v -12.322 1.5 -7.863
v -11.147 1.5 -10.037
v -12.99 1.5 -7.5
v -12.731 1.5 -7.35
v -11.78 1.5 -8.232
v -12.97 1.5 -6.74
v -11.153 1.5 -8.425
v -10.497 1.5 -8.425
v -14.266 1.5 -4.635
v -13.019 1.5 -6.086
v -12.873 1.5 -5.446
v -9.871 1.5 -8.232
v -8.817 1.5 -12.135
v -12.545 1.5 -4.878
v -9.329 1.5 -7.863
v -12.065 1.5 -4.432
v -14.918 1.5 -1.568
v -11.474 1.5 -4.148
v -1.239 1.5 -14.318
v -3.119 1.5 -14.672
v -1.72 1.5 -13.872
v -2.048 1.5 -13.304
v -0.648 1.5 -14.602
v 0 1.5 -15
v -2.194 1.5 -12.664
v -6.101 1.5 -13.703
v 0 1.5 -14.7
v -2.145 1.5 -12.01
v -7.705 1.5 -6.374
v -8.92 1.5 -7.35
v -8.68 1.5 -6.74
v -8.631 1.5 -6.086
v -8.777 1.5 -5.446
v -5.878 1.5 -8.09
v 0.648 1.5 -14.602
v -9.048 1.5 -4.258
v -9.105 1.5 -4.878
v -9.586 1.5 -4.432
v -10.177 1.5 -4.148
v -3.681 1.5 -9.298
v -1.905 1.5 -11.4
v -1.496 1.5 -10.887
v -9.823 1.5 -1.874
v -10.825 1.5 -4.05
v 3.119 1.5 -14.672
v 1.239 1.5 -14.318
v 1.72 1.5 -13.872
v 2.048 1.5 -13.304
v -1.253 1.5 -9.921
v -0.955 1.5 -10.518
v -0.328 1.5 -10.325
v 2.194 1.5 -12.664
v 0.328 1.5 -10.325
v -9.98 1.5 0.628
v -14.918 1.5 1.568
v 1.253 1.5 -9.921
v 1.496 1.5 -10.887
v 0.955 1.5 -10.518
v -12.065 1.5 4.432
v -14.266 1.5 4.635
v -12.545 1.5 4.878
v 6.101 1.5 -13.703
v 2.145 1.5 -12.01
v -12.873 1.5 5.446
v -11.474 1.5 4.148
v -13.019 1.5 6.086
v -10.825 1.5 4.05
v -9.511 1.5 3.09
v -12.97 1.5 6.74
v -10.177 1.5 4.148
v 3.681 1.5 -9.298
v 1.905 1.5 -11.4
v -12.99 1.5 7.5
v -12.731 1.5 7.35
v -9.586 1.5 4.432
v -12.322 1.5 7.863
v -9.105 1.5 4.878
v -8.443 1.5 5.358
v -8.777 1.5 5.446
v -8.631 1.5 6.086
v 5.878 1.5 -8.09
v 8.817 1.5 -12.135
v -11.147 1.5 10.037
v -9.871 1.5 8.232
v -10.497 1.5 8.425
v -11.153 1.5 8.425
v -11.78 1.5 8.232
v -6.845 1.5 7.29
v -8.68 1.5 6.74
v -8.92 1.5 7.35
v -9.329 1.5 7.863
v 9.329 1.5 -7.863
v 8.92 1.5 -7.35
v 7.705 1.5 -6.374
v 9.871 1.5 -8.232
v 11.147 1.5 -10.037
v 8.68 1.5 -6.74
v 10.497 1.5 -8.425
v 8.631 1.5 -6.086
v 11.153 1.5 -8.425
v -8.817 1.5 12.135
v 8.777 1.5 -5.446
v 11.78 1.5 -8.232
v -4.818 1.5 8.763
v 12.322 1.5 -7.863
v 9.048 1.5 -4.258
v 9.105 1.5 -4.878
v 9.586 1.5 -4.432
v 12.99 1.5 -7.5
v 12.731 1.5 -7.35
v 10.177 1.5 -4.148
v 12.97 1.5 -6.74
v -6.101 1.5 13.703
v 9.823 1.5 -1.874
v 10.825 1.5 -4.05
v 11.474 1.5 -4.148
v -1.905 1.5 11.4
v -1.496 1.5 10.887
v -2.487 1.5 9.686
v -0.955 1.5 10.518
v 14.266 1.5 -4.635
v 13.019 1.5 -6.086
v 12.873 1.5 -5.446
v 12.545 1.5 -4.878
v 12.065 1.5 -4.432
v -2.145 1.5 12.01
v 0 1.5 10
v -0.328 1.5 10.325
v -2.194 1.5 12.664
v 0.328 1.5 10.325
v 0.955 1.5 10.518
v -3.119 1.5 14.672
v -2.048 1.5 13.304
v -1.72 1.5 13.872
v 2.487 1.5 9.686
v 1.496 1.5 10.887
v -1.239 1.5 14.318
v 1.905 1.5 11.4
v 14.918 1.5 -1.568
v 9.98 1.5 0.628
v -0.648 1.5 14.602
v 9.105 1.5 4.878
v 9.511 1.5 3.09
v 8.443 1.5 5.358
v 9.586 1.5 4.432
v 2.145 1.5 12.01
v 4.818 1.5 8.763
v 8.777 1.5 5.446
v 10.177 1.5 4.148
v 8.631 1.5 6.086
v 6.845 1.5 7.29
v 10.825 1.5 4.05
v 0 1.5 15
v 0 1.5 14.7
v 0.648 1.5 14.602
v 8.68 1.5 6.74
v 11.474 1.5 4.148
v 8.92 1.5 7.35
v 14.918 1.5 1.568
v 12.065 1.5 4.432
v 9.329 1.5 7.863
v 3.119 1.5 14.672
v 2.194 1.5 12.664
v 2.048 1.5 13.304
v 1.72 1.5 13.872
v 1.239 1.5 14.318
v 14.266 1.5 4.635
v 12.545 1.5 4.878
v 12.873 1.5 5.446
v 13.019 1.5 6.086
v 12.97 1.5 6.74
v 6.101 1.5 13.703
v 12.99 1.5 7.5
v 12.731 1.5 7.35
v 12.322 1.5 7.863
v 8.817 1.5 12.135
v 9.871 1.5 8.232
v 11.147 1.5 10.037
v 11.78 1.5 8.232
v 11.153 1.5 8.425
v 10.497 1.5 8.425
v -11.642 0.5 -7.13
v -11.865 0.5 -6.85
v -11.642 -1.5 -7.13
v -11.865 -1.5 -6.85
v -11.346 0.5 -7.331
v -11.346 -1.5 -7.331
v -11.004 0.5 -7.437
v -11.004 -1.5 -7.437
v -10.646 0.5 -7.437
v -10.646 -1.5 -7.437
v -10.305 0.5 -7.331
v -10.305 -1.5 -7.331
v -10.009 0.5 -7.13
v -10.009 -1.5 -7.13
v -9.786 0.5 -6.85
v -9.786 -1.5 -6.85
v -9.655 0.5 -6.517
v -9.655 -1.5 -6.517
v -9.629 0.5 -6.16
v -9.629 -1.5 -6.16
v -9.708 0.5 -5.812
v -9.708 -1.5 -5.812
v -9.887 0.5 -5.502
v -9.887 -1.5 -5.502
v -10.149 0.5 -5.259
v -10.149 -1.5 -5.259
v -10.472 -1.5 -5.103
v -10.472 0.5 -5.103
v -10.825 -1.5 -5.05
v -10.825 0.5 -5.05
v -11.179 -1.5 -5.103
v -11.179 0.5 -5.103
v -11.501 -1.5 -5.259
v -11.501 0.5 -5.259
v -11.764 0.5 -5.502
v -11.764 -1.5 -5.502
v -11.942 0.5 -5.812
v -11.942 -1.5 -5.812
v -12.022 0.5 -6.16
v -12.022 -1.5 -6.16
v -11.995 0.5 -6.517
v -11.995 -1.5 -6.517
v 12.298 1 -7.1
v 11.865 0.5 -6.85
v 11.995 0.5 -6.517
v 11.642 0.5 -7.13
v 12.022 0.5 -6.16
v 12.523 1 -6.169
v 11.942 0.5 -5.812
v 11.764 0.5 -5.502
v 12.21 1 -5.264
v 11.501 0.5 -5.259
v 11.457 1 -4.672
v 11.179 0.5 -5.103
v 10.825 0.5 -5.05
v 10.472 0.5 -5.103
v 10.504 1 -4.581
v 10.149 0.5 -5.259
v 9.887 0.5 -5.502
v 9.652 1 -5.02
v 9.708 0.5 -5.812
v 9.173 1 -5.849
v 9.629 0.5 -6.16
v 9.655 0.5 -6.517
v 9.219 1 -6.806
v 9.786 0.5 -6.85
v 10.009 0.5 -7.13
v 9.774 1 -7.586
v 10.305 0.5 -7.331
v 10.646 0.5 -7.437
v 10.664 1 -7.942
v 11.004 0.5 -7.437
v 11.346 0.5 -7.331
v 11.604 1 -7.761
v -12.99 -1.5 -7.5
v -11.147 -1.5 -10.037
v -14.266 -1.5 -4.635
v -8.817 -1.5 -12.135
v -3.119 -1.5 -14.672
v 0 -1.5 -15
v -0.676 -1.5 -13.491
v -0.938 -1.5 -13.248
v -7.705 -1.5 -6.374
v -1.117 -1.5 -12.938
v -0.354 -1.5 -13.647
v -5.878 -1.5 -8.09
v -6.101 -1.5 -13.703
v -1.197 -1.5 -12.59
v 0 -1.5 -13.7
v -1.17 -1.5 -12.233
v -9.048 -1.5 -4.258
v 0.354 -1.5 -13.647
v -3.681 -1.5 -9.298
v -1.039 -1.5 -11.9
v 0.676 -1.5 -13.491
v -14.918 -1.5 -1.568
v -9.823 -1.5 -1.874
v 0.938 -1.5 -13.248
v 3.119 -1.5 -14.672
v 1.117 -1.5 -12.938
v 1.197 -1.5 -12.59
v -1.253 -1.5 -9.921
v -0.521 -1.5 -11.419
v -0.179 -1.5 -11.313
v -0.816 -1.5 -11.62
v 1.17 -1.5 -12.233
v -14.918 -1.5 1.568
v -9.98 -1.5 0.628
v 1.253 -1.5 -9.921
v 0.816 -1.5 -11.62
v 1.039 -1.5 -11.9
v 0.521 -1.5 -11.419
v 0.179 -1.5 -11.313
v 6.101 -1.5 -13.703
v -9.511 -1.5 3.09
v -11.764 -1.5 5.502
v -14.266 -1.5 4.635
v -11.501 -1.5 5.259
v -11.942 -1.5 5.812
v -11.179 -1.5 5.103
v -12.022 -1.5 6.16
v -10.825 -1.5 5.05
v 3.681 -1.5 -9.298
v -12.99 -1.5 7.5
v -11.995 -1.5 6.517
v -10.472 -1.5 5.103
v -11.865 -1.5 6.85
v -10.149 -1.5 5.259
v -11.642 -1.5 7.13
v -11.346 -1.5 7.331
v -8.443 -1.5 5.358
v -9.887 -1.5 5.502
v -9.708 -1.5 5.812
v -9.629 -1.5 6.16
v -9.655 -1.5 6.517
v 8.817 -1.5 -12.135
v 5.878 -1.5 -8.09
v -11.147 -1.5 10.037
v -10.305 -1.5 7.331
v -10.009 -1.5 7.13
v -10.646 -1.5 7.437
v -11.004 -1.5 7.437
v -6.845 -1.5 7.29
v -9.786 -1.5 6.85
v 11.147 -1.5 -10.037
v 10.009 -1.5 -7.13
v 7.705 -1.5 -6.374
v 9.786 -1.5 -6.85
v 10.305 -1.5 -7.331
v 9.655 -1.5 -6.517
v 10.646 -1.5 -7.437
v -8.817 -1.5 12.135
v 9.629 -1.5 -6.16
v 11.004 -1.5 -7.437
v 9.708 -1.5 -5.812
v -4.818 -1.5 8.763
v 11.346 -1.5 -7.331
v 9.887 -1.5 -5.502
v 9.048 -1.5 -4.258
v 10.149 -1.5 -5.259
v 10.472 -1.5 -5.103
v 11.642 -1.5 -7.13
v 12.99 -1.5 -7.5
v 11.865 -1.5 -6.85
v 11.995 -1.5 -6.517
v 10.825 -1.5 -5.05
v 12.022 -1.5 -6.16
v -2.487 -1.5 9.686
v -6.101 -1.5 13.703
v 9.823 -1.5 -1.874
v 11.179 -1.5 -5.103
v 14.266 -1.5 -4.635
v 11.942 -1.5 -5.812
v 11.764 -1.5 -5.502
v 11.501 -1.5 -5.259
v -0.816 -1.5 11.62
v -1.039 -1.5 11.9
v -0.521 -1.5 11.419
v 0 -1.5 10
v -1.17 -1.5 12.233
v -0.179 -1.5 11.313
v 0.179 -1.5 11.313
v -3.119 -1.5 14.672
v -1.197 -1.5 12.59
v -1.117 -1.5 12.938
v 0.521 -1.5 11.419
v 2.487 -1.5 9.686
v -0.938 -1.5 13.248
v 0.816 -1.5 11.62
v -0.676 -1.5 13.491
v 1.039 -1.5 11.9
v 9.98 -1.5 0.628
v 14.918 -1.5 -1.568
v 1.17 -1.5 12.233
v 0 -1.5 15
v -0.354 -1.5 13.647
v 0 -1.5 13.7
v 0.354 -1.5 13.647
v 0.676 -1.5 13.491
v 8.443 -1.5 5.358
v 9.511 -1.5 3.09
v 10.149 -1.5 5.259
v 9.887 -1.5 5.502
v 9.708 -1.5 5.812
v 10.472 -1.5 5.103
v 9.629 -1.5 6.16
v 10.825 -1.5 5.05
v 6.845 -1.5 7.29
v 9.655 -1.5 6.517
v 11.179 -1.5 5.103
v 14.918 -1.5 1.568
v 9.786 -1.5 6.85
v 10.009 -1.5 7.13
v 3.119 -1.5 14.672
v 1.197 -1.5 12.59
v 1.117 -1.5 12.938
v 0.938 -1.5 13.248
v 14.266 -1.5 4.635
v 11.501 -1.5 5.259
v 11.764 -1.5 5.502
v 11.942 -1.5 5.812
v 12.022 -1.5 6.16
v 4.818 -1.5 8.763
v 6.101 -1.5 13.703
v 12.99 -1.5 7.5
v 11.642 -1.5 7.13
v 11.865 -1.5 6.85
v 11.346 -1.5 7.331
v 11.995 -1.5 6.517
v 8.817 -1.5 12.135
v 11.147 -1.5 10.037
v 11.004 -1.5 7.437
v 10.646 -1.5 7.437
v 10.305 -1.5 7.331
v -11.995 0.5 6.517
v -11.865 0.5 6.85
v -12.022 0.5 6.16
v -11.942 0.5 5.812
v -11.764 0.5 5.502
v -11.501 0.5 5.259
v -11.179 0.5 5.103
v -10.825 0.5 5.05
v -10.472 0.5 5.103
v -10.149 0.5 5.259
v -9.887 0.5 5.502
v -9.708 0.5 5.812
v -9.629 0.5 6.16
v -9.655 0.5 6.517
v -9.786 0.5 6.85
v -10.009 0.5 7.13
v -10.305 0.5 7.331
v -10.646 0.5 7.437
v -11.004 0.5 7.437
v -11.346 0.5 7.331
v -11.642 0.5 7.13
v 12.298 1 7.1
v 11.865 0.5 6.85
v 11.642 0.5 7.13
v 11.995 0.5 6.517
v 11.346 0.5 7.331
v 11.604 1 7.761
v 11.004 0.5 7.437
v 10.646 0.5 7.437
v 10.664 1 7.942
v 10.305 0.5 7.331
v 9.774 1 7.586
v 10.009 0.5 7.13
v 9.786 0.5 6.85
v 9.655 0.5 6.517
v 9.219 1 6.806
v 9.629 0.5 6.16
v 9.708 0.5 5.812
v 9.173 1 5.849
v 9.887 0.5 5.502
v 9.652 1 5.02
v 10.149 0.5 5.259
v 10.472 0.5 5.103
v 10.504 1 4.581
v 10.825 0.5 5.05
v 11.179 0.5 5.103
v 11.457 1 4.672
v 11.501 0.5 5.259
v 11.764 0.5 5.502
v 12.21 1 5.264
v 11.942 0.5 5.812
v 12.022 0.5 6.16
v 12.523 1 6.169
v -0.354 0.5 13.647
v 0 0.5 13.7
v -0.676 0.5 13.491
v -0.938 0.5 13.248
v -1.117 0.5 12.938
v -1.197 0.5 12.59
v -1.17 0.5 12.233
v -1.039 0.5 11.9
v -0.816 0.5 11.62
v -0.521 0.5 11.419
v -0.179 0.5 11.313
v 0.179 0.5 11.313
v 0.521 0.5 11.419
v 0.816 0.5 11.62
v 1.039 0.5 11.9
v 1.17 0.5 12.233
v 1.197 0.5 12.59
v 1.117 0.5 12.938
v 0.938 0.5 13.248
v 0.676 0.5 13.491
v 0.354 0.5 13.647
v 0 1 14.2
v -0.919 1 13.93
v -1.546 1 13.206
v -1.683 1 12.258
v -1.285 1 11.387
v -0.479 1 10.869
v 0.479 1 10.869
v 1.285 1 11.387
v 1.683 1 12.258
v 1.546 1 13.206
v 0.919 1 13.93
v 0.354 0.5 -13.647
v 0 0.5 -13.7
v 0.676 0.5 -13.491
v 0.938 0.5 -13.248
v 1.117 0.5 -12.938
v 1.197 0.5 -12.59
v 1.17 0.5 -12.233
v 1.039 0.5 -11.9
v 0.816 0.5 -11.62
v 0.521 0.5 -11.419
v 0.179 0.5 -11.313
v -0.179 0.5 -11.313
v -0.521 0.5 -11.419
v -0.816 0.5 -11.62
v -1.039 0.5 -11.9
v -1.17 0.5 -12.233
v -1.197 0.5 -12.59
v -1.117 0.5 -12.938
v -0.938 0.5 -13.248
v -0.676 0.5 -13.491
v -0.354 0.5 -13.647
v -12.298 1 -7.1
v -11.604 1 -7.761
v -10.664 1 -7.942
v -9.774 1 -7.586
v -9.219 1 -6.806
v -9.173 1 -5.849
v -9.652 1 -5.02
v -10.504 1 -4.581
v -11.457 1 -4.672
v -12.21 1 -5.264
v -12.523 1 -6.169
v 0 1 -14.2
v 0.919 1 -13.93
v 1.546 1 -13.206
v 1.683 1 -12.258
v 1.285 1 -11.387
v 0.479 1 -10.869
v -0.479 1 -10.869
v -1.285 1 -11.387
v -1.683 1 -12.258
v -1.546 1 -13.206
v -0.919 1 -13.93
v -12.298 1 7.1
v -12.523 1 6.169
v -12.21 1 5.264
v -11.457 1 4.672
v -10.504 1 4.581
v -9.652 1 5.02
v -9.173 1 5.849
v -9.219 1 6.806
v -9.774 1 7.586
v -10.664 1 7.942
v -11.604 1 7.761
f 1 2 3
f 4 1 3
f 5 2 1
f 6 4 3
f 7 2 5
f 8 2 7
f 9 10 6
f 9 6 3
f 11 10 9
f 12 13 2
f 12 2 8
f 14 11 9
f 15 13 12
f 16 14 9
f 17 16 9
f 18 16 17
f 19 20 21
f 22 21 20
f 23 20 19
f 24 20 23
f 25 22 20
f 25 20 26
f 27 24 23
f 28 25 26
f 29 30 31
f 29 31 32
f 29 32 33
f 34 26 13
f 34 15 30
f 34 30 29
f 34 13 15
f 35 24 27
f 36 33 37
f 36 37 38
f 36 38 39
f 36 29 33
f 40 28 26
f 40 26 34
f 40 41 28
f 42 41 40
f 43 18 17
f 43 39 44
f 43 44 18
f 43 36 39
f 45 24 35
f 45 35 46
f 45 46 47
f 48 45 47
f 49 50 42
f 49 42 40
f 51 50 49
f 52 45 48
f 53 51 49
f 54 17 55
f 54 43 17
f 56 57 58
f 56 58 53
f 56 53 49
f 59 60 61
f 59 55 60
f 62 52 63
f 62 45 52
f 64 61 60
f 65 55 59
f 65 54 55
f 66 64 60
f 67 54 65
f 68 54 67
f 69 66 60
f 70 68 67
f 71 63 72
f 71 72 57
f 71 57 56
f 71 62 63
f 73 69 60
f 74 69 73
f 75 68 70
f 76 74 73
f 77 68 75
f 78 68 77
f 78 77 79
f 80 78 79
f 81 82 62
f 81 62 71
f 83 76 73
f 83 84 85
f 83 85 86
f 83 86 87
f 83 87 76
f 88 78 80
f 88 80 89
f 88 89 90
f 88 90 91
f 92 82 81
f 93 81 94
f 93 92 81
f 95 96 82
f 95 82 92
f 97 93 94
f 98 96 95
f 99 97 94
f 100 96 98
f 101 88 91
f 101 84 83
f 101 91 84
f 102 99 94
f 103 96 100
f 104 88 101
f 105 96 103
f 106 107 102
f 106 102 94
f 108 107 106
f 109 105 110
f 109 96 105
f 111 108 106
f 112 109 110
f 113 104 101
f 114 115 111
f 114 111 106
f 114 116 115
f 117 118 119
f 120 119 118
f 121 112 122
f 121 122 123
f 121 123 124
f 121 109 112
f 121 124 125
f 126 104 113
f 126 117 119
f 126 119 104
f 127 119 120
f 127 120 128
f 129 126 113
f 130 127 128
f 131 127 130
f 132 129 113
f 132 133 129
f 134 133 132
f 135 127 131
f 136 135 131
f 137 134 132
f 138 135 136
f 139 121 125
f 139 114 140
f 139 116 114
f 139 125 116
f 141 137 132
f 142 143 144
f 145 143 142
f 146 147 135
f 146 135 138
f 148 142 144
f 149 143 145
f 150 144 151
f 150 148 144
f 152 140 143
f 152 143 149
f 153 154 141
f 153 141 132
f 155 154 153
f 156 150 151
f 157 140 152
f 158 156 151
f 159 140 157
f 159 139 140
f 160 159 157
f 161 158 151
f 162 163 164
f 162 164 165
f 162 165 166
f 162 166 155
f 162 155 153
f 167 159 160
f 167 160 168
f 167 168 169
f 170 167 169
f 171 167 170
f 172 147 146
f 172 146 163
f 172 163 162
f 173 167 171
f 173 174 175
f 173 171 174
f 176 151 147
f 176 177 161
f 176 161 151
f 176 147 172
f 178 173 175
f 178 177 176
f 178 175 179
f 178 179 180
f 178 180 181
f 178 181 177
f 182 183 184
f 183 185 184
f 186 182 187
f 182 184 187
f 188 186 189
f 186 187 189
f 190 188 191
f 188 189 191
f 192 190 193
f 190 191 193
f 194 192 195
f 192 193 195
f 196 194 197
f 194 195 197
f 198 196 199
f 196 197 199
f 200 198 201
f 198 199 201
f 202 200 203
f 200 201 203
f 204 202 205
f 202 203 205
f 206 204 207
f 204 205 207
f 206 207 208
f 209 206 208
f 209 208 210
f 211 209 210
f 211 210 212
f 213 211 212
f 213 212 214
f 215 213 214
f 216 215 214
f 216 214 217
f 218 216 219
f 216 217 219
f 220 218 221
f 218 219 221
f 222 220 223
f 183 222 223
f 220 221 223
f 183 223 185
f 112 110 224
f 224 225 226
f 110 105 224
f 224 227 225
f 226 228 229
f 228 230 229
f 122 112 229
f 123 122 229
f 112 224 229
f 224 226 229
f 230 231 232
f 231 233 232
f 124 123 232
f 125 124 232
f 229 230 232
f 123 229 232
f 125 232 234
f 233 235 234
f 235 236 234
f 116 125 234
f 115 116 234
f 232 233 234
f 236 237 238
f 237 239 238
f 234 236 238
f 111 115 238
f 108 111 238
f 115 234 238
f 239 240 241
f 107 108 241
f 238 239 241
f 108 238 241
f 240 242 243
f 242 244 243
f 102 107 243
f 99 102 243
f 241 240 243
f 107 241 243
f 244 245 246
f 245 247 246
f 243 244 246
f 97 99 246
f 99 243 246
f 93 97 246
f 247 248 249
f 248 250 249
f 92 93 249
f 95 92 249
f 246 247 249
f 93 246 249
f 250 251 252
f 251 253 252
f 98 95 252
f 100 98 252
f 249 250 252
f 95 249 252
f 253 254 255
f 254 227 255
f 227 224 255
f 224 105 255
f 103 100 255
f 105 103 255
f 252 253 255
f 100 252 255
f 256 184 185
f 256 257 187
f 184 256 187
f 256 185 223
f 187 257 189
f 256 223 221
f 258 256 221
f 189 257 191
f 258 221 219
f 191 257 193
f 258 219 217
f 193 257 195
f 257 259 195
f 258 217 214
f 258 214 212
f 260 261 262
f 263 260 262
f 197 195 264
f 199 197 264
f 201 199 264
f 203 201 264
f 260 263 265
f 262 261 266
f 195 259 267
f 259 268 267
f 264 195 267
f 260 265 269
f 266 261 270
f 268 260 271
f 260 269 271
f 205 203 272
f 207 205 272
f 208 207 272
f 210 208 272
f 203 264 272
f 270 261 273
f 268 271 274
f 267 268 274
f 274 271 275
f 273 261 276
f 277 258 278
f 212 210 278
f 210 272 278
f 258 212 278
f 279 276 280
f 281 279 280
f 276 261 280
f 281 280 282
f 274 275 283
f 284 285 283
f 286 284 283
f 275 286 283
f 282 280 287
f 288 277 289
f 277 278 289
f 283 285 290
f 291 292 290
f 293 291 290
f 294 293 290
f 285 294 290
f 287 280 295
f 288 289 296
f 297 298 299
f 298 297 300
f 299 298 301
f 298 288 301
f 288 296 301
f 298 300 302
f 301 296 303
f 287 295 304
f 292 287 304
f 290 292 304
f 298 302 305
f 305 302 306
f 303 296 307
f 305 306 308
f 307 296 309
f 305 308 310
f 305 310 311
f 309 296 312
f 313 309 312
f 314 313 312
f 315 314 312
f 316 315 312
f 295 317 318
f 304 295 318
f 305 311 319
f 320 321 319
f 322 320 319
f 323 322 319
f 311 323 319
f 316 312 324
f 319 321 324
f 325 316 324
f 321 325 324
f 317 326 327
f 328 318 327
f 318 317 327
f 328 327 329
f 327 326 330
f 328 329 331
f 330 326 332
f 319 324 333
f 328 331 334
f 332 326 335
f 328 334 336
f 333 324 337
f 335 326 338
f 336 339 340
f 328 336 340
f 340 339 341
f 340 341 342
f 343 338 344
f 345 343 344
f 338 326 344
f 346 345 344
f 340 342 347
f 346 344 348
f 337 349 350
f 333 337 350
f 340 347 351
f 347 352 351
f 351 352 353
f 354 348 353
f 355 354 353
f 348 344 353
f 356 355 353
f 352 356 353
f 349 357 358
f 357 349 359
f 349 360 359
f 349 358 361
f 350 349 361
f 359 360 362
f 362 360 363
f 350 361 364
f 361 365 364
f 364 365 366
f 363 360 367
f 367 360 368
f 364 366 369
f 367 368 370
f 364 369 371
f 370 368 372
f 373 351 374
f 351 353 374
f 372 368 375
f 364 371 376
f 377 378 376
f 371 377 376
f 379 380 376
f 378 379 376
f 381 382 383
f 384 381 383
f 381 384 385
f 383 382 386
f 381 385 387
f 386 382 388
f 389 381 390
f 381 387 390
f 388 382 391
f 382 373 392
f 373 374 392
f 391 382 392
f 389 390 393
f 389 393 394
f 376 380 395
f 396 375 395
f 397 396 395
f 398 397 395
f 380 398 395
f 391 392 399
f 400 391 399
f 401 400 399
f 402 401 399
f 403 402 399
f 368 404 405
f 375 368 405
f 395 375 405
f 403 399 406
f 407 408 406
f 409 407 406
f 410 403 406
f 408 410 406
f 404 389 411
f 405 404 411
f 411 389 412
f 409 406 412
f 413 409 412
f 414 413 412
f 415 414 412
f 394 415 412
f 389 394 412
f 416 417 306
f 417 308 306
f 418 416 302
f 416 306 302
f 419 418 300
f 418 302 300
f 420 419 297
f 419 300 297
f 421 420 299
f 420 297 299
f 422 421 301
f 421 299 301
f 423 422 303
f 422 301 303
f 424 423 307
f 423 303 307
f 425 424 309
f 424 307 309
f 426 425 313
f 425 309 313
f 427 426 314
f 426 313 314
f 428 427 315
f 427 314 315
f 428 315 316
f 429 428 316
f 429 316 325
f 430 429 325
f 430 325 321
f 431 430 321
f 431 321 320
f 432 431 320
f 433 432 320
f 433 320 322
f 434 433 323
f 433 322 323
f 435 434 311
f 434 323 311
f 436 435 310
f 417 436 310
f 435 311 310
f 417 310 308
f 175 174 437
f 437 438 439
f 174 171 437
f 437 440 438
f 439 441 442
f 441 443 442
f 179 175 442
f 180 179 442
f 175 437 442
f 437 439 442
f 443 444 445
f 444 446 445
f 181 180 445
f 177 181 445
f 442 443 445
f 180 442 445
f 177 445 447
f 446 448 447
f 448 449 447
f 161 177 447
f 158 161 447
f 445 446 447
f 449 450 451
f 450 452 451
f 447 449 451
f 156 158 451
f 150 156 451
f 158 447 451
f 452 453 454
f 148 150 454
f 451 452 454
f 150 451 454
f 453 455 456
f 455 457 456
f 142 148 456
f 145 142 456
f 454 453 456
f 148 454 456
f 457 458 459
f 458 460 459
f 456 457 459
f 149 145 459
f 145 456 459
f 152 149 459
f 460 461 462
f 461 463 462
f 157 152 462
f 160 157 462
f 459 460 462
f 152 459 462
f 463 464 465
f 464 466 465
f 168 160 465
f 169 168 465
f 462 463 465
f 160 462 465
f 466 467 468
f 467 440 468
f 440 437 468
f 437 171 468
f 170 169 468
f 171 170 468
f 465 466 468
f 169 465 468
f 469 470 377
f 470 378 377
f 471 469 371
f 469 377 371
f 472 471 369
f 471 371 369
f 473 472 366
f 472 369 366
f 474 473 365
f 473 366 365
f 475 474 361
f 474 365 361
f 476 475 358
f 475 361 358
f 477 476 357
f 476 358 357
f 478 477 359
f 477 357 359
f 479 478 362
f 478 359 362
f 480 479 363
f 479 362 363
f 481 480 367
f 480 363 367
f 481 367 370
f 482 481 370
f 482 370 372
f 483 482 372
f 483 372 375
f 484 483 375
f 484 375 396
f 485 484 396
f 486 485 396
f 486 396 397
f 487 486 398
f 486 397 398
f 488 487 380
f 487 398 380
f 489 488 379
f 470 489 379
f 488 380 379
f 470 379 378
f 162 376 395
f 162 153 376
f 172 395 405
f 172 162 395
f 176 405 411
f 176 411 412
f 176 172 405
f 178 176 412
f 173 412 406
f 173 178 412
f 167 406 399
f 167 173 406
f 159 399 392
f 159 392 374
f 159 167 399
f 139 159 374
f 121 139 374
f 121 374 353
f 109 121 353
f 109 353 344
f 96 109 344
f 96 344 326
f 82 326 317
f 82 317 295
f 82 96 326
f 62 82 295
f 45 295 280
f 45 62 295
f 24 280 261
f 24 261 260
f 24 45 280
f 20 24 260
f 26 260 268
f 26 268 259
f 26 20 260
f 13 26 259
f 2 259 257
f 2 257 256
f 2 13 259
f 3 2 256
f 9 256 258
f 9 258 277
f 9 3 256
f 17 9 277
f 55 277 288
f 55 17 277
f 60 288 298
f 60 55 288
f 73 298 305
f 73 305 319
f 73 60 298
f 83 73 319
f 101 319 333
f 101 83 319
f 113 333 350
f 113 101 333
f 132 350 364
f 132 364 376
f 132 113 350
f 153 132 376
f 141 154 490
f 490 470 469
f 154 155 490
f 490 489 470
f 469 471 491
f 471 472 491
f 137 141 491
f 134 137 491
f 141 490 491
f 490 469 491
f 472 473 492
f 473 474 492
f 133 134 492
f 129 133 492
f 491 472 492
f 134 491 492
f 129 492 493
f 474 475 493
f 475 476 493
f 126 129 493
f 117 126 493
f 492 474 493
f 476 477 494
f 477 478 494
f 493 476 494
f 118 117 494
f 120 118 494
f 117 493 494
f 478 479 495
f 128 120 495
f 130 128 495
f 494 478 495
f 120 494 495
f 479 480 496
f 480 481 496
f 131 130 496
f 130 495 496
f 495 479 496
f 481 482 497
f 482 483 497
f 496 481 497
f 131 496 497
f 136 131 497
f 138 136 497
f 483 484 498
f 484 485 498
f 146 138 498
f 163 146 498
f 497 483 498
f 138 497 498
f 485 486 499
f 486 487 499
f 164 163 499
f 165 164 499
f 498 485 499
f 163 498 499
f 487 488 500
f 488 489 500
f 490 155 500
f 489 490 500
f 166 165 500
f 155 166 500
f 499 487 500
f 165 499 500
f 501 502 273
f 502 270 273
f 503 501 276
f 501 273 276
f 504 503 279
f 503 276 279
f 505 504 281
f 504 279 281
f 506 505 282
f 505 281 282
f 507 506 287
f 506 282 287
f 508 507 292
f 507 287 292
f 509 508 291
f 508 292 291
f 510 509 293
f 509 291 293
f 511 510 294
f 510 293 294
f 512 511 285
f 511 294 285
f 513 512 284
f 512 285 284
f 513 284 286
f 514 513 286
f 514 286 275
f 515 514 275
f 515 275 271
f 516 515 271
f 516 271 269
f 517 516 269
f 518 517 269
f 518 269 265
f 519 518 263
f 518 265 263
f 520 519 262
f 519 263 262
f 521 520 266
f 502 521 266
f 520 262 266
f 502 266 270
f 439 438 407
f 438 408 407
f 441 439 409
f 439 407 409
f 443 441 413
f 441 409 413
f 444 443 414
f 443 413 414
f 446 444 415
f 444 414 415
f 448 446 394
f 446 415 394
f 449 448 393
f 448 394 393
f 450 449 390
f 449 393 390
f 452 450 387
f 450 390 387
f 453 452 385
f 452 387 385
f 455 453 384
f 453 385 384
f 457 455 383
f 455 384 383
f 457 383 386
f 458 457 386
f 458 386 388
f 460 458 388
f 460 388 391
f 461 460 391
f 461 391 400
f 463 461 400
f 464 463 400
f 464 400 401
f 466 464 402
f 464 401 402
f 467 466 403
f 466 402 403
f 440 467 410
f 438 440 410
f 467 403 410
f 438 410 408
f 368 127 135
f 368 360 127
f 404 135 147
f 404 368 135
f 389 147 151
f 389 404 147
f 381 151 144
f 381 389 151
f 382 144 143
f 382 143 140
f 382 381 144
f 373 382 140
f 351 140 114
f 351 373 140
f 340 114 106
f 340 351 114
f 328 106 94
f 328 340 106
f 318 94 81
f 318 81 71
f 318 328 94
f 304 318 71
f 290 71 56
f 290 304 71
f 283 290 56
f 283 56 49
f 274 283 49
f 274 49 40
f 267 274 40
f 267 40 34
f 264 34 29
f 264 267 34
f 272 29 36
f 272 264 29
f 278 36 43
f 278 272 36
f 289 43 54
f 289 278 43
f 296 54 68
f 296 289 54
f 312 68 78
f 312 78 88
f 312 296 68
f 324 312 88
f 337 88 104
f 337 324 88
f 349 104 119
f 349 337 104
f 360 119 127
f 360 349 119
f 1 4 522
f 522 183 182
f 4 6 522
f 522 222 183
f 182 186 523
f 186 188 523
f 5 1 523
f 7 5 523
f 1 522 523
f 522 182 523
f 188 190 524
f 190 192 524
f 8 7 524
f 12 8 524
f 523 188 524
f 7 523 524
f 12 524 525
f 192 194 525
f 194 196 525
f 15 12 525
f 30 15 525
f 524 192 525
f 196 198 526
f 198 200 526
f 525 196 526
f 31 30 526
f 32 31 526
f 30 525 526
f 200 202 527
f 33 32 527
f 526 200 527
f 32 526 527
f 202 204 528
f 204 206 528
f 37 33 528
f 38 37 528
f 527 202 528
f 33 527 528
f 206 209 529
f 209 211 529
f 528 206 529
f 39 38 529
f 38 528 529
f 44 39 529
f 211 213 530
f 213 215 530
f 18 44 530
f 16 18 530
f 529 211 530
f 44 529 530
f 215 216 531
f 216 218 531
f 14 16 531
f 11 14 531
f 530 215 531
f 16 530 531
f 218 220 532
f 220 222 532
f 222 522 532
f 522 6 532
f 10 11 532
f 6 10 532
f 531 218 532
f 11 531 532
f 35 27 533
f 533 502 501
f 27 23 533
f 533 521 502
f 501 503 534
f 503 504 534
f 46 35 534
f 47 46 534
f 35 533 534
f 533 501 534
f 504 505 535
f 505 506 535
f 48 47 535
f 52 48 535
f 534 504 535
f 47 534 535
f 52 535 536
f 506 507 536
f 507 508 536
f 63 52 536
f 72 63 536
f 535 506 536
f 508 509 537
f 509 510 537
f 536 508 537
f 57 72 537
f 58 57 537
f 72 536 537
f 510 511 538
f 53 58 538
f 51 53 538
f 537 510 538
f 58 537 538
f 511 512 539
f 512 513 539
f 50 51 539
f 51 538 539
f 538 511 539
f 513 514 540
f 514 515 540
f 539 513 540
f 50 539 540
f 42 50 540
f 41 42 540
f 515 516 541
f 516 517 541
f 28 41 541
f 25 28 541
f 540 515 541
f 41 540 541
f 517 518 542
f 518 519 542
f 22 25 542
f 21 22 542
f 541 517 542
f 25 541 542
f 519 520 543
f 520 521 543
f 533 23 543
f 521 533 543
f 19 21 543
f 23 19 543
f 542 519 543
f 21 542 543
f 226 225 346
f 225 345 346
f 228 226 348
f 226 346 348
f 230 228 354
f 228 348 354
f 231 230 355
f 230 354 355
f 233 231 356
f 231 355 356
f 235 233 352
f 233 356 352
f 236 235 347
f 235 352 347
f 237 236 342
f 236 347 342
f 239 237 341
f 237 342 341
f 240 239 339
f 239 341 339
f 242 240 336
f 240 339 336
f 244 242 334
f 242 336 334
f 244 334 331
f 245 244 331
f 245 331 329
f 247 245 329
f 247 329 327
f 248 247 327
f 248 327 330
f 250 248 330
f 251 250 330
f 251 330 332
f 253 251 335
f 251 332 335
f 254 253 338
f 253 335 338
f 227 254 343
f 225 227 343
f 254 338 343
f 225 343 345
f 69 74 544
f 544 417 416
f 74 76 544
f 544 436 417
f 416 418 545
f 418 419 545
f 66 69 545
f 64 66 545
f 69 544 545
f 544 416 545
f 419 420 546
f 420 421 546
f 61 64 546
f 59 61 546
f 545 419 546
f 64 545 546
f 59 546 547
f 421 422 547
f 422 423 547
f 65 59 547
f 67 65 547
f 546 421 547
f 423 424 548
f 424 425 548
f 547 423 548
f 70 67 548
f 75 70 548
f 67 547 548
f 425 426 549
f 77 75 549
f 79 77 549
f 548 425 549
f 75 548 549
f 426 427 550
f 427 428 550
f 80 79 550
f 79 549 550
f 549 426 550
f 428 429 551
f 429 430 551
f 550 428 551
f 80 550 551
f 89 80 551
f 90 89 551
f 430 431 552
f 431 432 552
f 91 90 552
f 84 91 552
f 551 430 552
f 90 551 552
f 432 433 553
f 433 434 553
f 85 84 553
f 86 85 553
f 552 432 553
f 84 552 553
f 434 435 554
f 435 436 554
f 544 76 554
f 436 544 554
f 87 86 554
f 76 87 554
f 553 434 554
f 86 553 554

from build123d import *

# Parameters (mm, degrees)
SKETCH1_R                                       = 15
SKETCH1_R_2                                     = 10
BOSS_EXTRUDE1_DEPTH                             = 1.5
CSK_FOR_M2_FLAT_HEAD_MACHINE_SCREW1_D           = 2.4
CSK_FOR_M2_FLAT_HEAD_MACHINE_SCREW1_CSINK_D     = 4.4
CSK_FOR_M2_FLAT_HEAD_MACHINE_SCREW1_CSINK_ANGLE = 90
CIRPATTERN1_COUNT                               = 6


with BuildPart() as part:
    # Sketch1 → Boss-Extrude1 (new, symmetric)
    with BuildSketch(Plane(origin=(0, 0, 0), x_dir=(1, 0, 0), z_dir=(0, 1, 0))):
        with Locations(Location((0, 0, 0), (0, 0, 270))):
            Circle(SKETCH1_R)
        with Locations(Location((0, 0, 0), (0, 0, 270))):
            Circle(SKETCH1_R_2, mode=Mode.SUBTRACT)
    extrude(amount=BOSS_EXTRUDE1_DEPTH, both=True)

    # CSK for M2 Flat Head Machine Screw1 (through all)
    with Locations(Plane(origin=(0, 1.5, -12.5), x_dir=(0, 0, 1), z_dir=(0, 1, 0))):
        with Locations((0, 0)):
            csk_for_m2_flat_head_machine_screw1 = CounterSinkHole(CSK_FOR_M2_FLAT_HEAD_MACHINE_SCREW1_D / 2, CSK_FOR_M2_FLAT_HEAD_MACHINE_SCREW1_CSINK_D / 2, counter_sink_angle=CSK_FOR_M2_FLAT_HEAD_MACHINE_SCREW1_CSINK_ANGLE)

    # CirPattern1: CSK for M2 Flat Head Machine Screw1 ×6 about axis
    cirpattern1_axis = Axis((0, 0, 0), (0, 1, 0))
    for i in range(1, CIRPATTERN1_COUNT):
        add(csk_for_m2_flat_head_machine_screw1.rotate(cirpattern1_axis, i * 360 / CIRPATTERN1_COUNT), mode=Mode.SUBTRACT)


solid = part.part
